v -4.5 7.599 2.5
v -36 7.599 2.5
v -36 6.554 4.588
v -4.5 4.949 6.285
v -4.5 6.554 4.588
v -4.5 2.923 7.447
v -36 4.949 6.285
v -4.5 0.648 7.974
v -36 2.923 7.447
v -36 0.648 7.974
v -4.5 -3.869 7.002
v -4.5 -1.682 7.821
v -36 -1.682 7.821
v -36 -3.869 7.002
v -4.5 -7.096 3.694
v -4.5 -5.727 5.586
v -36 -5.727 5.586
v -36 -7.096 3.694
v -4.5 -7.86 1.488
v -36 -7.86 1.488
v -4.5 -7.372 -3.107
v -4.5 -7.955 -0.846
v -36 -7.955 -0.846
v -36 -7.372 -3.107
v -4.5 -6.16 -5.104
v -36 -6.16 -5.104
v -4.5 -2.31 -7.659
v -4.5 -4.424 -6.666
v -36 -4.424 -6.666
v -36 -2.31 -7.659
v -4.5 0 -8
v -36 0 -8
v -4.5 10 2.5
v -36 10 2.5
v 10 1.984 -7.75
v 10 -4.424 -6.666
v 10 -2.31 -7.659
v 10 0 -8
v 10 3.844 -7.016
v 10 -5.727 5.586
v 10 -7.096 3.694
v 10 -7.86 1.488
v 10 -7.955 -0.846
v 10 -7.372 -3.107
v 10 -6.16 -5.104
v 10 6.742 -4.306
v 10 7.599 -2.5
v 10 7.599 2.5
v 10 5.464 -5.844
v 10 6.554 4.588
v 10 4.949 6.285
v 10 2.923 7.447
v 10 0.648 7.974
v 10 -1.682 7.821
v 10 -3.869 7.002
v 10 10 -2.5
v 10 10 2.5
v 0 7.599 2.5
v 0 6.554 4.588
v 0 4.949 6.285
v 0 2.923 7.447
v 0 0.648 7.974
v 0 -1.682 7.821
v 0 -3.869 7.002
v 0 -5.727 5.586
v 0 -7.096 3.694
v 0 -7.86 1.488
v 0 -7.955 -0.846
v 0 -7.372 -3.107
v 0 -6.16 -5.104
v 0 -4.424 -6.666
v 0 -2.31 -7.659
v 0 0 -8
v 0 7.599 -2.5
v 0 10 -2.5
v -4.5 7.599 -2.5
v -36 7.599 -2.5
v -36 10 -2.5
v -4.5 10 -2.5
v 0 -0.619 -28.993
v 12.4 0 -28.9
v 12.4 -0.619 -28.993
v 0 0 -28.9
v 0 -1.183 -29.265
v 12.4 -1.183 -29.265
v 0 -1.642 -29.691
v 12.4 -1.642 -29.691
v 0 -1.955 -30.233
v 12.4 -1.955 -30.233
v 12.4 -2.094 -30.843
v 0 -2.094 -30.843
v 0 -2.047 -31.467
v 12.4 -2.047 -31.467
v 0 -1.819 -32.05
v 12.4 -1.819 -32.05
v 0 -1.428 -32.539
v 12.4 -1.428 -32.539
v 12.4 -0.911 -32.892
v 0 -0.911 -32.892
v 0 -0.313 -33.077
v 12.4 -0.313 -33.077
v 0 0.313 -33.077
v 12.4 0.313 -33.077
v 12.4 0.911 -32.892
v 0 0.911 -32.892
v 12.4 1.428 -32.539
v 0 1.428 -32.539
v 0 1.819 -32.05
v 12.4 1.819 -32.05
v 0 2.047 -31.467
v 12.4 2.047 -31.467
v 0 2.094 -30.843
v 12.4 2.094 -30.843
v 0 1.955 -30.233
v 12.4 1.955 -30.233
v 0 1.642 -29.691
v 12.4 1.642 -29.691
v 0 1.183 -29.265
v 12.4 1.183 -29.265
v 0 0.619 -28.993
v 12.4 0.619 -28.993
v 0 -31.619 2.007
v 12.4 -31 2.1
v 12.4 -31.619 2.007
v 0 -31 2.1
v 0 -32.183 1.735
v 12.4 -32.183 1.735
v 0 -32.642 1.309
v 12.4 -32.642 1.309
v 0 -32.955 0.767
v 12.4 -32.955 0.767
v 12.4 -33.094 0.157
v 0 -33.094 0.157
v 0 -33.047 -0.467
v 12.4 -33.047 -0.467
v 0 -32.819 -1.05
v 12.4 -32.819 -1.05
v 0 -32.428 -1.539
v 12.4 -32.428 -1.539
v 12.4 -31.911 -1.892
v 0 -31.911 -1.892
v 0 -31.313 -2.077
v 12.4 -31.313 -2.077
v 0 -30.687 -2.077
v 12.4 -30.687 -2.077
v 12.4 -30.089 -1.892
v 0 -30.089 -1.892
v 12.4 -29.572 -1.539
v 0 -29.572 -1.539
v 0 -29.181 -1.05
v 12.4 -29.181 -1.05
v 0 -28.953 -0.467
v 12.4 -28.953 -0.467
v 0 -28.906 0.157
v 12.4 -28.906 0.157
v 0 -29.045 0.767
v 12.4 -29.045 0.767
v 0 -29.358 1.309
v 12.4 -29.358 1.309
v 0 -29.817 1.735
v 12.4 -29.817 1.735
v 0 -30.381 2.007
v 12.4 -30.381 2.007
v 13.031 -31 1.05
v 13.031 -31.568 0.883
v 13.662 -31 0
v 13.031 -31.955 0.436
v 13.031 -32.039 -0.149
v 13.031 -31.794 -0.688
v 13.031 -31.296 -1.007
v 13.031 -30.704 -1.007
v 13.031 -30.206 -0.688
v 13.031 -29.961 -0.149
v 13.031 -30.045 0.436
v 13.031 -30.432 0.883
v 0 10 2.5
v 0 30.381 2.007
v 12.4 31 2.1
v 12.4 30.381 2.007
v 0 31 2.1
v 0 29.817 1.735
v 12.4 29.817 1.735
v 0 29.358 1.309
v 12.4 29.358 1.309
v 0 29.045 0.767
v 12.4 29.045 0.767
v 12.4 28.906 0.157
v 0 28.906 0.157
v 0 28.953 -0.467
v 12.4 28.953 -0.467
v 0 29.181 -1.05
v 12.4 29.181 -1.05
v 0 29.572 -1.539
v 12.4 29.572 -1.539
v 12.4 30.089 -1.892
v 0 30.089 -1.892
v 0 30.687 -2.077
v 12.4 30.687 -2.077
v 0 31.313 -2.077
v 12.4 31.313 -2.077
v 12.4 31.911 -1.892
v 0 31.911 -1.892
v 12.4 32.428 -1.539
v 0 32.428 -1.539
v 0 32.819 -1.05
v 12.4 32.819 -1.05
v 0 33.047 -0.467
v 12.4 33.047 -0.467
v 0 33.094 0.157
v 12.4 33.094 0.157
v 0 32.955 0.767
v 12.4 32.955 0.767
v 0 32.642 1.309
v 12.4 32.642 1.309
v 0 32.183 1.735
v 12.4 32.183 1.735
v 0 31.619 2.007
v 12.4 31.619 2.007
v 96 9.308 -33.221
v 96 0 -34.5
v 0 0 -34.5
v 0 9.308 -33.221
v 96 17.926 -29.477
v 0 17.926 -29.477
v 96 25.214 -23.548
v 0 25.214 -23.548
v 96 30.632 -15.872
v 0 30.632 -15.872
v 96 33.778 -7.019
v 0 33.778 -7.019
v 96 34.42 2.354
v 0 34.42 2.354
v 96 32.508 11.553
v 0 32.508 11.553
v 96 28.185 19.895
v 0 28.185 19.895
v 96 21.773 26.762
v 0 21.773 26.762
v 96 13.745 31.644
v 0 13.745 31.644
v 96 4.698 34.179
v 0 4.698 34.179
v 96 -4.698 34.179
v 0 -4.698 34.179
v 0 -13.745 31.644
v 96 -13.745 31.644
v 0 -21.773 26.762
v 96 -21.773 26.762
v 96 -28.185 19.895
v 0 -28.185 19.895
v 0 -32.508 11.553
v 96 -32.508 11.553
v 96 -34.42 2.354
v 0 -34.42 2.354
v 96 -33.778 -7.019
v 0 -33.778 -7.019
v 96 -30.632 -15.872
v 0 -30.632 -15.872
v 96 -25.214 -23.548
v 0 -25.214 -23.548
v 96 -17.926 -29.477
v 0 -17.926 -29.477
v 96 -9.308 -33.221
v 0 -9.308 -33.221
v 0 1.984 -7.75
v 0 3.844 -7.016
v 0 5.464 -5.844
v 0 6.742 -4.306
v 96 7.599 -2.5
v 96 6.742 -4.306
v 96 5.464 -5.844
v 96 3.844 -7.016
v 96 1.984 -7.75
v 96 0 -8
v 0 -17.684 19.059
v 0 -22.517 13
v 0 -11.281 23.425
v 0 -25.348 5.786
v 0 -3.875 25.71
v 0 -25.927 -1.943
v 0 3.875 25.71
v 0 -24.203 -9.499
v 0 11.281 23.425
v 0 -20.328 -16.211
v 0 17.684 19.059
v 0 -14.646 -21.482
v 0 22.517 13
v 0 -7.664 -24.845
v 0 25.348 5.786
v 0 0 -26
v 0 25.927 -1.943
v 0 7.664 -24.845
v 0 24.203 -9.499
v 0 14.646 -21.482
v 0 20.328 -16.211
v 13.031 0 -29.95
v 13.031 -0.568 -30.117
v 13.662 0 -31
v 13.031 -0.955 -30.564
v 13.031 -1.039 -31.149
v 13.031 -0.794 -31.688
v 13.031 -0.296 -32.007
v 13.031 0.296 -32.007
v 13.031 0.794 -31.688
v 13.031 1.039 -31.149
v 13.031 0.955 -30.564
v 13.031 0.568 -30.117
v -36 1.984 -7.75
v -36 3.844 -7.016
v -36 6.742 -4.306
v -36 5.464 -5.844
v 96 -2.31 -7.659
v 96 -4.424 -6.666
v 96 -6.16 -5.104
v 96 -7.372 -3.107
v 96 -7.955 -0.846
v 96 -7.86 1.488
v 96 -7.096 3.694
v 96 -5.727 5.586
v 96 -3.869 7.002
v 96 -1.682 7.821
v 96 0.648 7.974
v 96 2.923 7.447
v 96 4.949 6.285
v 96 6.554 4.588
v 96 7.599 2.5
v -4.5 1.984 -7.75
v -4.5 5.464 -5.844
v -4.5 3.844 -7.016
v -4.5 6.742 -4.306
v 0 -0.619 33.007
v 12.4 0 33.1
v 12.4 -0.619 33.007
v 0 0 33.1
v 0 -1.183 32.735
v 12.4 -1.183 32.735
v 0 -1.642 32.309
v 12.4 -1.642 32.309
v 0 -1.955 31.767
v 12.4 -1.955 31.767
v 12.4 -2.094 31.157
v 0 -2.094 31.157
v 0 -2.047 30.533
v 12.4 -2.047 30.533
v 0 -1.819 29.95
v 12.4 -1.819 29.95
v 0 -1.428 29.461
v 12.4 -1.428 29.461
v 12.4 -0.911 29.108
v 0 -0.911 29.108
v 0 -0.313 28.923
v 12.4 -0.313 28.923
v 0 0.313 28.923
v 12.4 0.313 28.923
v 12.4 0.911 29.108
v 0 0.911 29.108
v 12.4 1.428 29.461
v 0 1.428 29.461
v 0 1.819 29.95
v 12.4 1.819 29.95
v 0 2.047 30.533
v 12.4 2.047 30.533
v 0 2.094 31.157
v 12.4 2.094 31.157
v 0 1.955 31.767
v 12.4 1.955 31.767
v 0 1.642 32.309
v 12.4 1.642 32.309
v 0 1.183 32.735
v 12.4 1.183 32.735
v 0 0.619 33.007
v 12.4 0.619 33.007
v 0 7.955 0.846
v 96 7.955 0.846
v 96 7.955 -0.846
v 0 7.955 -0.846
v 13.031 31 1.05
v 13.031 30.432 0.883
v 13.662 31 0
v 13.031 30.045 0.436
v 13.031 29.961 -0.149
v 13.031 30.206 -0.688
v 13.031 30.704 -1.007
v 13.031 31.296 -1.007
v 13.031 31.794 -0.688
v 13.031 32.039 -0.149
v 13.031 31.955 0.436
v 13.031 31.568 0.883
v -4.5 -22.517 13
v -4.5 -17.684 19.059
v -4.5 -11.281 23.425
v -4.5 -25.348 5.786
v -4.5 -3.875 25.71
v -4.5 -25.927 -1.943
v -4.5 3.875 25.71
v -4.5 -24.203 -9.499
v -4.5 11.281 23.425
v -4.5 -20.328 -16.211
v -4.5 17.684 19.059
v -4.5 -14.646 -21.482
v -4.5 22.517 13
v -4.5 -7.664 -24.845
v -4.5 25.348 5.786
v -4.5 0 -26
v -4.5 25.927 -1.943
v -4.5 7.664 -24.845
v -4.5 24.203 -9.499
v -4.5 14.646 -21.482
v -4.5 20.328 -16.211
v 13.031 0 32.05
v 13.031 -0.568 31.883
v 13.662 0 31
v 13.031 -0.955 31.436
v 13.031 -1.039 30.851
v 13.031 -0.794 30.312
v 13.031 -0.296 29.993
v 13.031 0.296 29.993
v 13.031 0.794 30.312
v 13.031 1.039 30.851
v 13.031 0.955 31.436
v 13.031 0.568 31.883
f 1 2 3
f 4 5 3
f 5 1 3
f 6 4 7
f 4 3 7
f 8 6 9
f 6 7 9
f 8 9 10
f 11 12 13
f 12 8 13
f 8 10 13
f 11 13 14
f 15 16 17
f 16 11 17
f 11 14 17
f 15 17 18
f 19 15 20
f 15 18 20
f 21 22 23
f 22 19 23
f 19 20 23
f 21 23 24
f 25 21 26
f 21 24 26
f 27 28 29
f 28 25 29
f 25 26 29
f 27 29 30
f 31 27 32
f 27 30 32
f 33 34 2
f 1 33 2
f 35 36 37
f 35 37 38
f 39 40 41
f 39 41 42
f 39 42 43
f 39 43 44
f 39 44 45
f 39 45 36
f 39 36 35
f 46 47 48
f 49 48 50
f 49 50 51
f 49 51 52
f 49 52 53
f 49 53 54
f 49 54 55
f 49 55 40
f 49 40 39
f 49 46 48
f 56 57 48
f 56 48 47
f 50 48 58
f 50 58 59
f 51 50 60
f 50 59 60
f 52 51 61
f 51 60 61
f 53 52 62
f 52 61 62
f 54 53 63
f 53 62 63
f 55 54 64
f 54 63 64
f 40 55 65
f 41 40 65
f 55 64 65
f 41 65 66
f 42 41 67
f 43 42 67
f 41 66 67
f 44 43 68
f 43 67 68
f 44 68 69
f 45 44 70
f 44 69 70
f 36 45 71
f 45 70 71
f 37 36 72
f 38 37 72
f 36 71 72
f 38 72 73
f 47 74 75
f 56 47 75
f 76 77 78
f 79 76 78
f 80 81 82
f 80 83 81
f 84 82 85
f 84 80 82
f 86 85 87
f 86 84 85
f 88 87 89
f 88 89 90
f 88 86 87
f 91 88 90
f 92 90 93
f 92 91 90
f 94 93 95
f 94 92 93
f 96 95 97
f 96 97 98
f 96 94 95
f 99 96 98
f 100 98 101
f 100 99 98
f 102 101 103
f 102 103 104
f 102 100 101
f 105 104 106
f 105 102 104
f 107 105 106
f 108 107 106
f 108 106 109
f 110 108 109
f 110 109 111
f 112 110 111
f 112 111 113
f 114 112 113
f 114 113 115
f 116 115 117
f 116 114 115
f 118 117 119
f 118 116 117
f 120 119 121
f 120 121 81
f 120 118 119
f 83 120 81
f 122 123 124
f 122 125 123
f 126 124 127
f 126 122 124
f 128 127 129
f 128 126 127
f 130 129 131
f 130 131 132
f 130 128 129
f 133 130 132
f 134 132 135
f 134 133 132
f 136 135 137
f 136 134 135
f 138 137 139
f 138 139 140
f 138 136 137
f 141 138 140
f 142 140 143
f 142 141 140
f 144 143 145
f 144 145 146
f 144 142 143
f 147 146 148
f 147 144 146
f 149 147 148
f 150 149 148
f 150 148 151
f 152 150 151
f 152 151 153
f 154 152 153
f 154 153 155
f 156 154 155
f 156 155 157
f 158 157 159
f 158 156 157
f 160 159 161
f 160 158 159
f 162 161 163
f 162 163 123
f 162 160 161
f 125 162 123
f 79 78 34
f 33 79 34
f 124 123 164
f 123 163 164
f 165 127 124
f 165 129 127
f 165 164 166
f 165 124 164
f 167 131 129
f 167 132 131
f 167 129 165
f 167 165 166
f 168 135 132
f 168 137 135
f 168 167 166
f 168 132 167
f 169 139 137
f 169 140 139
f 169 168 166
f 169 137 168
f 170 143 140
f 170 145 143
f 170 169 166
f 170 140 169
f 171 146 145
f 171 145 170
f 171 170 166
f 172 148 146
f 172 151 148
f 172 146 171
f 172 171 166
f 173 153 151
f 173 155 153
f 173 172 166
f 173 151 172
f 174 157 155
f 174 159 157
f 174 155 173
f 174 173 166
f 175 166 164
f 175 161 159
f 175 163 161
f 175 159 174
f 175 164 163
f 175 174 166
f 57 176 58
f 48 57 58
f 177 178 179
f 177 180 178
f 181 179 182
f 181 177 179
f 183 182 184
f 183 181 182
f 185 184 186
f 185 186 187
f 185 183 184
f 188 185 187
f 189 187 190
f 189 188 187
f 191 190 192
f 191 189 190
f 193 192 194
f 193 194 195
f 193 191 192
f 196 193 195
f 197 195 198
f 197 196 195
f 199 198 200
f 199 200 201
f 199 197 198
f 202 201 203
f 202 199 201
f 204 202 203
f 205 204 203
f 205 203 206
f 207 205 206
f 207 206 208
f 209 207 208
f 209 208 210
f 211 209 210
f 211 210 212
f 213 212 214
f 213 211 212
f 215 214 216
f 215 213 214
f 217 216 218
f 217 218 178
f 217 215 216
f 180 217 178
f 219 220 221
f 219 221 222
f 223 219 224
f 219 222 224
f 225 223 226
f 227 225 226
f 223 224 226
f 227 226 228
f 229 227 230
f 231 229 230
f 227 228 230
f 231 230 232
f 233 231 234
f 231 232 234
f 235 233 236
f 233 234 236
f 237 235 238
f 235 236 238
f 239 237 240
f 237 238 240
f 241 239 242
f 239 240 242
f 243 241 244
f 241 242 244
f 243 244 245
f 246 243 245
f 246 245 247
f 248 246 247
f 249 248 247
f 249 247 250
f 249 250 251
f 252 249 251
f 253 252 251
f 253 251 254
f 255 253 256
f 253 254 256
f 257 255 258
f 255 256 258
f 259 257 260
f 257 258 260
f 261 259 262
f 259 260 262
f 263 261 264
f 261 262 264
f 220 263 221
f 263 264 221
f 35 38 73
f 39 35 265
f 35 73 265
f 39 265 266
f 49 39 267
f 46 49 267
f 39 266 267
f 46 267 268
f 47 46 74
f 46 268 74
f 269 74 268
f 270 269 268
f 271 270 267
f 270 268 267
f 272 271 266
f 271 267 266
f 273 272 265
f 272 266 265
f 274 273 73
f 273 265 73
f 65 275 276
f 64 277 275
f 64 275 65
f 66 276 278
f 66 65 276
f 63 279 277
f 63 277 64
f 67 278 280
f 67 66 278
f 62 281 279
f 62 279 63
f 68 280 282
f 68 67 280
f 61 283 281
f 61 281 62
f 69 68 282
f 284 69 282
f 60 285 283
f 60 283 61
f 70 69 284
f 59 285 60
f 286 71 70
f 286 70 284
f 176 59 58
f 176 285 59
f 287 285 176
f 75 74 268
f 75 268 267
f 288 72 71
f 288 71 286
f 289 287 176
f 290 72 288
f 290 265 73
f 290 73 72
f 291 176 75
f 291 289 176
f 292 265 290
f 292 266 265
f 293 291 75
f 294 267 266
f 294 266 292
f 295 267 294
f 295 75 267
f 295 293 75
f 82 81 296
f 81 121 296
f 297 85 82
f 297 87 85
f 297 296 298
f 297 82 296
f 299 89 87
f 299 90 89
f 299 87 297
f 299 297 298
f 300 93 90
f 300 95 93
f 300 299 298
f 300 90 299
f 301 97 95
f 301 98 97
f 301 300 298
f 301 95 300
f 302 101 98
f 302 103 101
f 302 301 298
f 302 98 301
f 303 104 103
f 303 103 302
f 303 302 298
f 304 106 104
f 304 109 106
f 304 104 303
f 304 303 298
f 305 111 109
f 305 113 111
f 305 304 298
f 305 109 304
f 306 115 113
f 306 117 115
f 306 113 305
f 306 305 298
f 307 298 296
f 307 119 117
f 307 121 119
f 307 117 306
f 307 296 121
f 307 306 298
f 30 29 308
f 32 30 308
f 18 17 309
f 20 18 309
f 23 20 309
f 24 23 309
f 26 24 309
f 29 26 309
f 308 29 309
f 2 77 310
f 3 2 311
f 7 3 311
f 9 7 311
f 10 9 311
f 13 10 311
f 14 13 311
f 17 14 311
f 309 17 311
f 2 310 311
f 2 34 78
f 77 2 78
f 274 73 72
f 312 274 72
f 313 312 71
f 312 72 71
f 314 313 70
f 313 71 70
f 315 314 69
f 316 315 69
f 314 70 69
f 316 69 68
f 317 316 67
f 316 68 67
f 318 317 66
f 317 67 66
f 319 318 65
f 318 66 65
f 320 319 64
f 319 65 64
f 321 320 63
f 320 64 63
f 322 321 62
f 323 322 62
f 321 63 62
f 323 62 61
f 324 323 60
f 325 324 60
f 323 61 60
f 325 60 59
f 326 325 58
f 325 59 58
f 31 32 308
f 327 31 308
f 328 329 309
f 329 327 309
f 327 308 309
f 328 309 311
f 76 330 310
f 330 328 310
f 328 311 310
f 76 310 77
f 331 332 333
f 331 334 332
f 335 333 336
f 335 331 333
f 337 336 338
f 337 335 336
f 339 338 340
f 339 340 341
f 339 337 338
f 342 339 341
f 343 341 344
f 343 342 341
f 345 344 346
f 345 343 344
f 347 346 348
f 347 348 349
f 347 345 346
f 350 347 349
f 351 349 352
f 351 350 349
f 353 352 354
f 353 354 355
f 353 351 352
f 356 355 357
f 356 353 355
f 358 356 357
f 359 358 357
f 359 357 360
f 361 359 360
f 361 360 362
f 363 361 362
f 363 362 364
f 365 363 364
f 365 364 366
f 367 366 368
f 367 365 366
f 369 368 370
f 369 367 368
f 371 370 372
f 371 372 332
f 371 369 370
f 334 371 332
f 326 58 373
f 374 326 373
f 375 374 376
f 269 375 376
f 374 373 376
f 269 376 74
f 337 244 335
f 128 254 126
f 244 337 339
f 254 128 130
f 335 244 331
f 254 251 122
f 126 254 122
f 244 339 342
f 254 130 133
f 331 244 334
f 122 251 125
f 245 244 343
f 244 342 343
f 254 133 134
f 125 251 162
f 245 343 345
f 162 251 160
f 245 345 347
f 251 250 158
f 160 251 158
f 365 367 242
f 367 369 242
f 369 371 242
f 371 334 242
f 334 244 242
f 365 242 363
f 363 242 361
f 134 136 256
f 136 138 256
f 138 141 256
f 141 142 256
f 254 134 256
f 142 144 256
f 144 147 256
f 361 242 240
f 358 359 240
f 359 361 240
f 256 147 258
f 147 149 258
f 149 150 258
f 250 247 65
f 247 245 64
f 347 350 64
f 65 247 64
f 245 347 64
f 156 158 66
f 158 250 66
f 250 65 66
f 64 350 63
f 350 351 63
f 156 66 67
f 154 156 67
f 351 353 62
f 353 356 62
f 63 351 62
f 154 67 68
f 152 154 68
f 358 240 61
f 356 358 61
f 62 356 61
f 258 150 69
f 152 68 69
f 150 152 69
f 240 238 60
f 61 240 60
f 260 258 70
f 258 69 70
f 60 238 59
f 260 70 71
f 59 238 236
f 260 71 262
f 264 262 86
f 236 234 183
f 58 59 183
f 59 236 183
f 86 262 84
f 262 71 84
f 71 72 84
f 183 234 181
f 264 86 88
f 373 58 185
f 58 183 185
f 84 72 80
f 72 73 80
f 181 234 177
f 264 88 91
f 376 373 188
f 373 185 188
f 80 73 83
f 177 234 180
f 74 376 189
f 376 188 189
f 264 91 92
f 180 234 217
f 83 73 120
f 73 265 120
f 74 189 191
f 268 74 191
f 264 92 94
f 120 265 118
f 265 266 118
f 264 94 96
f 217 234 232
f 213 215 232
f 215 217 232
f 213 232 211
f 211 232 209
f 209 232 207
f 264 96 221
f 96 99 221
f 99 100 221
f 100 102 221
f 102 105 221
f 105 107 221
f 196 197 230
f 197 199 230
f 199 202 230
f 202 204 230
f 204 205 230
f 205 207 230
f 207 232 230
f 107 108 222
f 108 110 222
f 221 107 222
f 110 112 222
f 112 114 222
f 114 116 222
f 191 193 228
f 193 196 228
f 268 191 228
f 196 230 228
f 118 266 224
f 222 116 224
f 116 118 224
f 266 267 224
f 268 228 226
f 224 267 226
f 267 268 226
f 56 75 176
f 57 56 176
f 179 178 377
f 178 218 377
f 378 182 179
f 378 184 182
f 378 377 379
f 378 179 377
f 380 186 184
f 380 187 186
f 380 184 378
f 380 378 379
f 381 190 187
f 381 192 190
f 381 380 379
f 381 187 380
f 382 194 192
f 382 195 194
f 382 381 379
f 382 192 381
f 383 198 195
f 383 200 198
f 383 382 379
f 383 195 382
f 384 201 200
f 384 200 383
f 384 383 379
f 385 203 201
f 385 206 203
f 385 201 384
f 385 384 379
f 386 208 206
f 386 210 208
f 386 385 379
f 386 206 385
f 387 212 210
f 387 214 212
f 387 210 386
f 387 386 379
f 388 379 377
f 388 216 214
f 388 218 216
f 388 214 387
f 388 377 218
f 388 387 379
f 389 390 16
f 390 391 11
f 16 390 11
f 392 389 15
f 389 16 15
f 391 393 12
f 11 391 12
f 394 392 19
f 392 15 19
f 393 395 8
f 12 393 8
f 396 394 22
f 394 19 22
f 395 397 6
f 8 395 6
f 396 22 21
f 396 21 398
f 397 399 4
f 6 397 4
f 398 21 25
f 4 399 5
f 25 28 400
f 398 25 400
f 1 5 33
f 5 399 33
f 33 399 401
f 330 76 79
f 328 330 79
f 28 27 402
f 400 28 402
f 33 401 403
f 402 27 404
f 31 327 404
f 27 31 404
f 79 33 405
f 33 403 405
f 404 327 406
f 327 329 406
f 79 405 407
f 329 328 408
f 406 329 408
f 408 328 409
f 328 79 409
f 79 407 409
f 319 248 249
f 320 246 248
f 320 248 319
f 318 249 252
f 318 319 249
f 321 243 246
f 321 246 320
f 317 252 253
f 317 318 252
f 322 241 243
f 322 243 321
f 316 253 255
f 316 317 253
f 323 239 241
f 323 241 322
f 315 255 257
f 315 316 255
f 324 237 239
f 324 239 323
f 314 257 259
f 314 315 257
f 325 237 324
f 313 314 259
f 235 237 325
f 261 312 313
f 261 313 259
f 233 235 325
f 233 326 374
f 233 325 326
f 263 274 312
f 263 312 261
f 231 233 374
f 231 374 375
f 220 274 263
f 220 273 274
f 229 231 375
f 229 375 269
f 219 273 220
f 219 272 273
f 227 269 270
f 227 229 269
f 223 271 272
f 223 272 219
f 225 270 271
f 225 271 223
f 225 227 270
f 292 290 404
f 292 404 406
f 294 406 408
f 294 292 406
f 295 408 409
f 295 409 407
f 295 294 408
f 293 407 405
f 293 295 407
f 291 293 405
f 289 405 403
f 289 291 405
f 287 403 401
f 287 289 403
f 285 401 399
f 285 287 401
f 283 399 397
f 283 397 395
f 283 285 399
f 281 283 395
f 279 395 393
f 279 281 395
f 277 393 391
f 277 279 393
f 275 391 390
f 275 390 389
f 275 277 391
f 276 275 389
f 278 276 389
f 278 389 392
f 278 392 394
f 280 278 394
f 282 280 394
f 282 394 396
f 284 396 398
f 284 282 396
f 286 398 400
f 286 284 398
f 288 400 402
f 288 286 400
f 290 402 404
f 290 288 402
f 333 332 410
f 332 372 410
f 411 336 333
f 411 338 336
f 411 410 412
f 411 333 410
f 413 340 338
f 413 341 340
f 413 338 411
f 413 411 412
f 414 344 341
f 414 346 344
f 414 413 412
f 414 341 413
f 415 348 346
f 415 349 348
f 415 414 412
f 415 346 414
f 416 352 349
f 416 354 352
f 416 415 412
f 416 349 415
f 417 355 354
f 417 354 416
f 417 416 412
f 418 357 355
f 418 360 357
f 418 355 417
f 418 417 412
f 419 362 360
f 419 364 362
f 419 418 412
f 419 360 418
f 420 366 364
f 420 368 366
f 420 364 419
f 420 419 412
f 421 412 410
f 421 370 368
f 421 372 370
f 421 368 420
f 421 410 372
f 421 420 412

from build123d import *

# Parameters (mm, degrees)
BOSS_EXTRUDE1_DEPTH        = 10
BOSS_EXTRUDE1_DEPTH_BACK   = 36
BOSS_EXTRUDE2_START        = -4.5
SKETCH1_3_R                = 26
BOSS_EXTRUDE2_DEPTH        = 4.5
SKETCH1_4_R                = 34.5
SKETCH1_4_R_2              = 8
BOSS_EXTRUDE3_DEPTH        = 96
M5_TAPPED_HOLE1_AT_2_COUNT = 2
M5_TAPPED_HOLE1_AT_2_PITCH = 43.840620434
M5_TAPPED_HOLE1_AT_3_COUNT = 2
M5_TAPPED_HOLE1_AT_3_PITCH = 62
M5_TAPPED_HOLE1_AT_4_COUNT = 2
M5_TAPPED_HOLE1_AT_4_PITCH = 43.840620434


with BuildPart() as part:
    # Sketch1 → Boss-Extrude1 (new, two sides: drawn at the far end of the back side and taken through both)
    with BuildSketch(Plane(origin=(0, 0, 0), x_dir=(0, 0, -1), z_dir=(1, 0, 0)).offset(-BOSS_EXTRUDE1_DEPTH_BACK)):
        with BuildLine():
            Line((2.5, 7.599342077), (2.5, 10))
            Line((2.5, 10), (-2.5, 10))
            Line((-2.5, 10), (-2.5, 7.599342077))
            ThreePointArc((-2.5, 7.599342077), (0, -8), (2.5, 7.599342077))
        make_face()
    extrude(amount=BOSS_EXTRUDE1_DEPTH + BOSS_EXTRUDE1_DEPTH_BACK)

    # Sketch1<3> → Boss-Extrude2 (add)
    with BuildSketch(Plane(origin=(0, 0, 0), x_dir=(0, 0, -1), z_dir=(1, 0, 0)).offset(BOSS_EXTRUDE2_START)):
        Circle(SKETCH1_3_R)
        with BuildLine():
            Line((-2.5, 10), (2.5, 10))
            Line((2.5, 10), (2.5, 7.599342077))
            ThreePointArc((2.5, 7.599342077), (6.480740698, 4.69041576), (8, 0))
            ThreePointArc((8, 0), (-4.69041576, -6.480740698), (-2.5, 7.599342077))
            Line((-2.5, 7.599342077), (-2.5, 10))
        make_face(mode=Mode.SUBTRACT)
    extrude(amount=BOSS_EXTRUDE2_DEPTH)


with BuildPart() as body_2:
    # Sketch1<4> → Boss-Extrude3 (new body)
    with BuildSketch(Plane(origin=(0, 0, 0), x_dir=(0, 0, -1), z_dir=(1, 0, 0))):
        Circle(SKETCH1_4_R)
        Circle(SKETCH1_4_R_2, mode=Mode.SUBTRACT)
    extrude(amount=BOSS_EXTRUDE3_DEPTH)

    # Sketch3 → M5 Tapped Hole1 (revolve, cut)
    with BuildSketch(Plane.ZX.offset(31)):
        Polygon((0, 0), (0, 13.6618073), (2.1, 12.4), (2.1, 0), align=None)
    m5_tapped_hole1 = revolve(axis=Axis((-6.35, 31, 0), (1, 0, 0)), mode=Mode.SUBTRACT)

    # M5 Tapped Hole1 at 2: M5 Tapped Hole1 ×2
    with Locations(*[Vector(0, -0.7071067811865476, -0.7071067811865476) * (i * M5_TAPPED_HOLE1_AT_2_PITCH) for i in range(1, M5_TAPPED_HOLE1_AT_2_COUNT)]):
        add(m5_tapped_hole1, mode=Mode.SUBTRACT)

    # M5 Tapped Hole1 at 3: M5 Tapped Hole1 ×2
    with Locations(*[(0, -i * M5_TAPPED_HOLE1_AT_3_PITCH, 0) for i in range(1, M5_TAPPED_HOLE1_AT_3_COUNT)]):
        add(m5_tapped_hole1, mode=Mode.SUBTRACT)

    # M5 Tapped Hole1 at 4: M5 Tapped Hole1 ×2
    with Locations(*[Vector(0, -0.7071067811865476, 0.7071067811865476) * (i * M5_TAPPED_HOLE1_AT_4_PITCH) for i in range(1, M5_TAPPED_HOLE1_AT_4_COUNT)]):
        add(m5_tapped_hole1, mode=Mode.SUBTRACT)


solid = Compound([part.part, body_2.part])
